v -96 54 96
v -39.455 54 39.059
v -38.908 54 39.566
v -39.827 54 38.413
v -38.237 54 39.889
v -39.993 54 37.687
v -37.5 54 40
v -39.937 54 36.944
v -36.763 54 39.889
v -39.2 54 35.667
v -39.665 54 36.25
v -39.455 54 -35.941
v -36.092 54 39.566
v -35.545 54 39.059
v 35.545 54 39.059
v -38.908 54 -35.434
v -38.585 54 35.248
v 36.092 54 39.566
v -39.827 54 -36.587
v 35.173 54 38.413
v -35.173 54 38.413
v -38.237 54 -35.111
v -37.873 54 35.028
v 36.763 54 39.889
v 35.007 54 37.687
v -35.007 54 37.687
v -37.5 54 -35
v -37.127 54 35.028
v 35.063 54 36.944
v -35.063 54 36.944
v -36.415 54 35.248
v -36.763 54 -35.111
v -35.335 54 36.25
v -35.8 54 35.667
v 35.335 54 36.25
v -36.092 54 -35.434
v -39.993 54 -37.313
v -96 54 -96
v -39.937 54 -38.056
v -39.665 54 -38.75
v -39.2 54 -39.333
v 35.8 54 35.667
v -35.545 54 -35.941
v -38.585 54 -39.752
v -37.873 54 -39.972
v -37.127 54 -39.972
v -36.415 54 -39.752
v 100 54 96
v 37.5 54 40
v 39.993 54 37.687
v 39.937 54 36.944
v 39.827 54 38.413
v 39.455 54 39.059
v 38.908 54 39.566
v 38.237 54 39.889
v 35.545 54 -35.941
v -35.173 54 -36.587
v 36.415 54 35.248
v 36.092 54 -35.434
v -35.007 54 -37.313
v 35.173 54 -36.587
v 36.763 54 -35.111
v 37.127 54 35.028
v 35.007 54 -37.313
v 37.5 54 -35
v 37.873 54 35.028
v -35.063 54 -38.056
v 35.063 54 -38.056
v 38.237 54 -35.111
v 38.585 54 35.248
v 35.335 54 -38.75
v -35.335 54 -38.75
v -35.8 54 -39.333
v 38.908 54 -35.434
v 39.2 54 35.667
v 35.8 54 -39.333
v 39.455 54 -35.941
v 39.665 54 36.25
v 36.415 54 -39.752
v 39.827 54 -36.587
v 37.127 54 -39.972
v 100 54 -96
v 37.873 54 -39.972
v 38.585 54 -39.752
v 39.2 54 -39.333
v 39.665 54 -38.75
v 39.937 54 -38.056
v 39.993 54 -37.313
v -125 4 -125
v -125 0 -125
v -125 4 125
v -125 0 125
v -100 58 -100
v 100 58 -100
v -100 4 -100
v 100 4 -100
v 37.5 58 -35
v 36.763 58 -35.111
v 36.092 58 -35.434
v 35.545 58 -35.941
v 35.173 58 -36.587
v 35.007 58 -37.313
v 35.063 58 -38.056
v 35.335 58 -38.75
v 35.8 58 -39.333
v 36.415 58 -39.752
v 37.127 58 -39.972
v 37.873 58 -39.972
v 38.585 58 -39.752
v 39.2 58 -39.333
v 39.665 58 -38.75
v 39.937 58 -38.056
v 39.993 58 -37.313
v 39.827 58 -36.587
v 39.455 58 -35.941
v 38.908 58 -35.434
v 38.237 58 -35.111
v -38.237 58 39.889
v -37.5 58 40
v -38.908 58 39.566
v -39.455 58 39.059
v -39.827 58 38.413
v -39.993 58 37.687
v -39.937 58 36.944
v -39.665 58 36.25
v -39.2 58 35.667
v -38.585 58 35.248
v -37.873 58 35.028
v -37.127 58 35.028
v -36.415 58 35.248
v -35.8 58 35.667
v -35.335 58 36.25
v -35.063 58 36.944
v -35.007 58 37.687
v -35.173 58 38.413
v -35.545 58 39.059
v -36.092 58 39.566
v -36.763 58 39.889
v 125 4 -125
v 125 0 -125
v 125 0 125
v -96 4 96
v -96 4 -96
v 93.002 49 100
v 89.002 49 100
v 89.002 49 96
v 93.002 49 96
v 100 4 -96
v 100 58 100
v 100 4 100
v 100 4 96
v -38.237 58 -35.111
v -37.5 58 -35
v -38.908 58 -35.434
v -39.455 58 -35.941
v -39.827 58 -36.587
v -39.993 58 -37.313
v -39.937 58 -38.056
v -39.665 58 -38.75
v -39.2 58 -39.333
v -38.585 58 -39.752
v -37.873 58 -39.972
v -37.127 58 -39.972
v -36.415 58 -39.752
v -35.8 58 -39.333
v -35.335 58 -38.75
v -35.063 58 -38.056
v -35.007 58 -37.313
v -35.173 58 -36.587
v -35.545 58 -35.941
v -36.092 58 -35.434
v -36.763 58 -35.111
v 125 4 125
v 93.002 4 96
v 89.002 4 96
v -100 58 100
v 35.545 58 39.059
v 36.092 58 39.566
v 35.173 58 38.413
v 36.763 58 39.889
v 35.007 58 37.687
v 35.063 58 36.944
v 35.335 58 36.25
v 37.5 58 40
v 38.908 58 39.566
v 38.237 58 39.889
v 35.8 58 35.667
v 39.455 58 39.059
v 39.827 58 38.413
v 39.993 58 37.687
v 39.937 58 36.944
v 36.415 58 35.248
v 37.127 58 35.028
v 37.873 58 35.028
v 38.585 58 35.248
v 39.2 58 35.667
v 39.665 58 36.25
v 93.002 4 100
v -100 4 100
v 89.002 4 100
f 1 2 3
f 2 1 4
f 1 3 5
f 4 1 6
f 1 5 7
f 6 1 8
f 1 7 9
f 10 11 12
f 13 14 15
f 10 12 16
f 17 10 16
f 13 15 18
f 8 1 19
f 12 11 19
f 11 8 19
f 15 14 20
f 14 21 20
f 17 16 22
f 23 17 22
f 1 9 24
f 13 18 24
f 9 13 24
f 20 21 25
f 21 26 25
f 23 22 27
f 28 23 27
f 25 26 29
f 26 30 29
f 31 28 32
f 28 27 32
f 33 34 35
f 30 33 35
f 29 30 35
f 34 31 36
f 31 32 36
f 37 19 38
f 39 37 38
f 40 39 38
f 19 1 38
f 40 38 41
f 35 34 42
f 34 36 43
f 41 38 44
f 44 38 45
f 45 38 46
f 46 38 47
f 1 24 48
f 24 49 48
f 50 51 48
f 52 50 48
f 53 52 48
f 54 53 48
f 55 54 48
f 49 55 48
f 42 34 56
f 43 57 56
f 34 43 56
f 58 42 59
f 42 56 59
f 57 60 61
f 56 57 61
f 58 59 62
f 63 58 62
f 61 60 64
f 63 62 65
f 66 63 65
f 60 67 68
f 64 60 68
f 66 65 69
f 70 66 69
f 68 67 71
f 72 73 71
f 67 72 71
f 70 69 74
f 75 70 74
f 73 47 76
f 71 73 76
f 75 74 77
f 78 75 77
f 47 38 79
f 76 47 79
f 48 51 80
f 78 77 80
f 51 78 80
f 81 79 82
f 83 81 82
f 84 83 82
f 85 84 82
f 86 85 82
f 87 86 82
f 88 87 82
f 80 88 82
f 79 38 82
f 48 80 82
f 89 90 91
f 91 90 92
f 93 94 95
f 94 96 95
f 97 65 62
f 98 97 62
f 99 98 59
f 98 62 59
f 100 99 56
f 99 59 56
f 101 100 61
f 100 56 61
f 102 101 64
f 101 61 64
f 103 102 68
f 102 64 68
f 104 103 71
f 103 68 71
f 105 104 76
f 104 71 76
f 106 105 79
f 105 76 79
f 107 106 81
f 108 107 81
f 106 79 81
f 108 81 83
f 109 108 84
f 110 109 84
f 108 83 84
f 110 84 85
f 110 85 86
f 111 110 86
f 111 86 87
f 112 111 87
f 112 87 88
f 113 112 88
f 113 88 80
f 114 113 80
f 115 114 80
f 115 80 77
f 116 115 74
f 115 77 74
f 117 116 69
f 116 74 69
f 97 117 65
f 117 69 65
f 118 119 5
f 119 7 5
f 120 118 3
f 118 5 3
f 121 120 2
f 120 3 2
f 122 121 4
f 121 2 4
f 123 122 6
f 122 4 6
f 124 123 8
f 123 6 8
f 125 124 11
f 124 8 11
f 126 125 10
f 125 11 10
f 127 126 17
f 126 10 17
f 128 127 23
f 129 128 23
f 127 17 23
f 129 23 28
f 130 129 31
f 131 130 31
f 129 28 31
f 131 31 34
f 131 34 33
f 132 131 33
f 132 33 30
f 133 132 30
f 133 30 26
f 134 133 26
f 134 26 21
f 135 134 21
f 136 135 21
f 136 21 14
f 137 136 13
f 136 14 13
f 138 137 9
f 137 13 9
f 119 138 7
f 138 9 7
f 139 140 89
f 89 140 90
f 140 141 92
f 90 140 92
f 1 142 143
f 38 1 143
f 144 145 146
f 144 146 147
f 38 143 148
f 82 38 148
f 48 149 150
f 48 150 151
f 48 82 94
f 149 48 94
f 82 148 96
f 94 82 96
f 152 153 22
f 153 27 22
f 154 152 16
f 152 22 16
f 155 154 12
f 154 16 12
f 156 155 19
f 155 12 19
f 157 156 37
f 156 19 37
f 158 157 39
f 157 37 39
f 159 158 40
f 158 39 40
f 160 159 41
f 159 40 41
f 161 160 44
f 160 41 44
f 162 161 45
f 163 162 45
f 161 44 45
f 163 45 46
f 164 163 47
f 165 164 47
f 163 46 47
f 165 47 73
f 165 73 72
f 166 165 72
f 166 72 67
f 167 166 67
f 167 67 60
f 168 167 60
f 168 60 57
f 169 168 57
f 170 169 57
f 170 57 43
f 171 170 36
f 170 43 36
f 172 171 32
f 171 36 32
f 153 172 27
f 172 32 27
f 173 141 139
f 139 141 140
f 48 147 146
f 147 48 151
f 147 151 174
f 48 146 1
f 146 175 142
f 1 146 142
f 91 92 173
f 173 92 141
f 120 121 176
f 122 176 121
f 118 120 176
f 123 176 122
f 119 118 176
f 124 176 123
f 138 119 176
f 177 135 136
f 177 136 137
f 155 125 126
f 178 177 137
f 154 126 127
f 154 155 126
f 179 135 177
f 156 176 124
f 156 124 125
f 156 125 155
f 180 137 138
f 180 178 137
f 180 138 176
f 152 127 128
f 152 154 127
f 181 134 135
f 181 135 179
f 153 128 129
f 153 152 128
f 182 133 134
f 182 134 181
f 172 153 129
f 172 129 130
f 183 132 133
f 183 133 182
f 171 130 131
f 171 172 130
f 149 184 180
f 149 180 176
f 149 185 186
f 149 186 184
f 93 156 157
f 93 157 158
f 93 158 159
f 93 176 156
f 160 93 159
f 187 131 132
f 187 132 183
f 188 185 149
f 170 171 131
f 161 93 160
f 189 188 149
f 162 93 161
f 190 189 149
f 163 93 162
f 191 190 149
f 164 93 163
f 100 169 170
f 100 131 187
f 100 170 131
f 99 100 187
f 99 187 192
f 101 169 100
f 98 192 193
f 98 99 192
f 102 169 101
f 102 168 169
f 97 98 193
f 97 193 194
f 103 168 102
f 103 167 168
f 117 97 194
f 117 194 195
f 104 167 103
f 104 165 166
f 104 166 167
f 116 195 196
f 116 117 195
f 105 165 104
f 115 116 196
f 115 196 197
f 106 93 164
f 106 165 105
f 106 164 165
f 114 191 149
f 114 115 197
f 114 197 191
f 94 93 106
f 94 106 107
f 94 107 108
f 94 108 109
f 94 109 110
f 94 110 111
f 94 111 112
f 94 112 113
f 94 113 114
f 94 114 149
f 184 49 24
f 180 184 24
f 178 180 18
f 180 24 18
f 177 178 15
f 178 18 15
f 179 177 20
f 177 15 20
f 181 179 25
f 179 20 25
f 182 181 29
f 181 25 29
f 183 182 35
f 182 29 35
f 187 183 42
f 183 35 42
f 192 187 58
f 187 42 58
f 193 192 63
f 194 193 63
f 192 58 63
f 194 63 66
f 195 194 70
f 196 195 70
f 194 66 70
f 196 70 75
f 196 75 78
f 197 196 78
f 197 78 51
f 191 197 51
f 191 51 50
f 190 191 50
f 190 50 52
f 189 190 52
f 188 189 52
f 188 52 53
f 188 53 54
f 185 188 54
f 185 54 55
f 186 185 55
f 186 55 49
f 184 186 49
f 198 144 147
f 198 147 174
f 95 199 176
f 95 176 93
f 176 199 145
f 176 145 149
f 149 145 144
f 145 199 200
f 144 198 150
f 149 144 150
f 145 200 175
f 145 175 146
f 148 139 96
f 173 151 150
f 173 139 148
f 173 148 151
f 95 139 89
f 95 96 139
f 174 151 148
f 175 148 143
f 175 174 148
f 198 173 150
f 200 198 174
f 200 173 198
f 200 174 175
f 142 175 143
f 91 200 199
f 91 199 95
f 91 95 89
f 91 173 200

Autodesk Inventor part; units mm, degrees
ref_plane "YZ Plane" through (0, 0, 0) normal (1, 0, 0) x (0, 1, 0)
ref_plane "XZ Plane" through (0, 0, 0) normal (0, 1, 0) x (-1, 0, 0)
ref_plane "XY Plane" through (0, 0, 0) normal (0, 0, 1) x (1, 0, 0)
sketch "Sketch1" plane through (0, 0, 0) normal (0, 1, 0) x (-1, 0, 0)
  line L0 (-125, -125) -> (125, -125)
  line L1 (125, -125) -> (125, 125)
  line L2 (125, 125) -> (-125, 125)
  line L3 (-125, 125) -> (-125, -125)
  line L4 (-125, -125) -> (125, 125) construction
  line L5 (125, -125) -> (-125, 125) construction
  point P0 (0, 0)
  dimension "Width" = 250
  dimension "Length" = 250
extrude "Main Body Extrusion" add sketch "Sketch1" along normal blind 4
sketch "Sketch3" plane through (0, 4, 0) normal (0, 1, 0) x (1, 0, 0)
  line L0 (96, -96) -> (-96, -96)
  line L1 (-96, -96) -> (-96, 96)
  line L2 (-96, 96) -> (96, 96)
  line L3 (96, -96) -> (-96, 96) construction
  line L4 (-96, -96) -> (96, 96) construction
  line L5 (-125, 125) -> (-125, -125) projected
  line L6 (125, -125) -> (125, 125) projected
  line L7 (-125, -125) -> (125, -125) projected
  line L8 (100, -100) -> (-100, -100)
  line L9 (-100, -100) -> (-100, 100)
  line L10 (-100, 100) -> (100, 100)
  line L11 (100, -100) -> (-100, 100) construction
  line L12 (-100, -100) -> (100, 100) construction
  line L13 (96, 96) -> (100, 96)
  line L14 (96, -96) -> (100, -96)
  line L15 (100, 100) -> (100, 96)
  line L16 (100, -96) -> (100, -100)
  point P0 (0, 0)
  dimension "d16" = 192
  dimension "d17" = 200
  dimension "d18" = 200
extrude "Extrusion3" add sketch "Sketch3" along normal blind 50 from surface at 0
sketch "Sketch8" plane through (0, 4, 0) normal (0, 1, 0) x (1, 0, 0)
  line L0 (100, 100) -> (100, 96) projected
  line L1 (-96, 96) -> (-96, -96) projected
  line L2 (100, 96) -> (-96, 96) projected
  line L3 (-125, -125) -> (125, -125) projected
  line L4 (89, 96) -> (93, 96)
  line L5 (93, 96) -> (93, -125)
  line L6 (93, -125) -> (89, -125)
  line L7 (89, -125) -> (89, 96)
  line L8 (89, -96) -> (85, -96)
  line L9 (85, -96) -> (85, 96)
  line L10 (85, 96) -> (89, 96)
  line L11 (89, 96) -> (89, -96)
  line L12 (93, 96) -> (97, 96)
  line L13 (97, 96) -> (97, -96)
  line L14 (97, -96) -> (93, -96)
  line L15 (93, -96) -> (93, 96)
  point P0 (0, 0)
  point P1 (89, -125)
  dimension "d39" = 4
  dimension "d40" = 185
  dimension "d47" = 4
  dimension "d48" = 4
extrude "Extrusion8" cut sketch "Sketch8" along normal blind 2 contours L13 L14 L5 L2 | L7 L8 L9 L2
sketch "Sketch9" plane through (-100, 54, 100) normal (0, 0, 1) x (1, 0, 0)
  line L0 (0, -50) -> (200, -50) projected
  line L1 (193.0019, -50) -> (189.0019, -50)
  line L2 (189.0019, -50) -> (189.0019, -5)
  line L3 (189.0019, -5) -> (193.0019, -5)
  line L4 (193.0019, -5) -> (193.0019, -50)
  point P0 (100, -54)
  dimension "d41" = 4
  dimension "d42" = 45
extrude "Extrusion9" cut sketch "Sketch9" against normal up to surface (4 mm away)
sketch "Sketch10" plane through (-100, 54, -100) normal (0, 1, 0) x (1, 0, 0)
  line L0 (0, -200) -> (0, 0) projected
  line L1 (200, 0) -> (200, -4) projected
  line L2 (0, -200) -> (200, -200)
  line L3 (200, -200) -> (200, 0)
  line L4 (200, 0) -> (0, 0)
  line L5 (0, 0) -> (0, -200)
  point P0 (100, -100)
extrude "Extrusion10" add sketch "Sketch10" along normal blind 4
sketch "Sketch11" plane through (-100, 58, -100) normal (0, 1, 0) x (1, 0, 0)
  line L0 (50, -150) -> (150, -150)
  line L1 (150, -150) -> (150, -50)
  line L2 (150, -50) -> (50, -50)
  line L3 (50, -50) -> (50, -150)
  line L4 (50, -150) -> (150, -50) construction
  line L5 (150, -150) -> (50, -50) construction
  point P0 (100, -100)
  point P1 (62.5, -62.5)
  point P2 (62.5, -137.5)
  point P3 (137.5, -137.5)
  point P4 (137.5, -62.5)
  dimension "d56" = 100
  dimension "d57" = 100
  dimension "d58" = 12.5
  dimension "d59" = 12.5
  dimension "d62" = 360
hole "Hole1" at (-37.5, 58, -37.5) at (37.5, 58, -37.5) at (37.5, 58, 37.5) at (-37.5, 58, 37.5) direction (0, -1, 0) diameter 5 depth 4
properties part number "Acrylic Casing" material "Acetal Resin, White"
